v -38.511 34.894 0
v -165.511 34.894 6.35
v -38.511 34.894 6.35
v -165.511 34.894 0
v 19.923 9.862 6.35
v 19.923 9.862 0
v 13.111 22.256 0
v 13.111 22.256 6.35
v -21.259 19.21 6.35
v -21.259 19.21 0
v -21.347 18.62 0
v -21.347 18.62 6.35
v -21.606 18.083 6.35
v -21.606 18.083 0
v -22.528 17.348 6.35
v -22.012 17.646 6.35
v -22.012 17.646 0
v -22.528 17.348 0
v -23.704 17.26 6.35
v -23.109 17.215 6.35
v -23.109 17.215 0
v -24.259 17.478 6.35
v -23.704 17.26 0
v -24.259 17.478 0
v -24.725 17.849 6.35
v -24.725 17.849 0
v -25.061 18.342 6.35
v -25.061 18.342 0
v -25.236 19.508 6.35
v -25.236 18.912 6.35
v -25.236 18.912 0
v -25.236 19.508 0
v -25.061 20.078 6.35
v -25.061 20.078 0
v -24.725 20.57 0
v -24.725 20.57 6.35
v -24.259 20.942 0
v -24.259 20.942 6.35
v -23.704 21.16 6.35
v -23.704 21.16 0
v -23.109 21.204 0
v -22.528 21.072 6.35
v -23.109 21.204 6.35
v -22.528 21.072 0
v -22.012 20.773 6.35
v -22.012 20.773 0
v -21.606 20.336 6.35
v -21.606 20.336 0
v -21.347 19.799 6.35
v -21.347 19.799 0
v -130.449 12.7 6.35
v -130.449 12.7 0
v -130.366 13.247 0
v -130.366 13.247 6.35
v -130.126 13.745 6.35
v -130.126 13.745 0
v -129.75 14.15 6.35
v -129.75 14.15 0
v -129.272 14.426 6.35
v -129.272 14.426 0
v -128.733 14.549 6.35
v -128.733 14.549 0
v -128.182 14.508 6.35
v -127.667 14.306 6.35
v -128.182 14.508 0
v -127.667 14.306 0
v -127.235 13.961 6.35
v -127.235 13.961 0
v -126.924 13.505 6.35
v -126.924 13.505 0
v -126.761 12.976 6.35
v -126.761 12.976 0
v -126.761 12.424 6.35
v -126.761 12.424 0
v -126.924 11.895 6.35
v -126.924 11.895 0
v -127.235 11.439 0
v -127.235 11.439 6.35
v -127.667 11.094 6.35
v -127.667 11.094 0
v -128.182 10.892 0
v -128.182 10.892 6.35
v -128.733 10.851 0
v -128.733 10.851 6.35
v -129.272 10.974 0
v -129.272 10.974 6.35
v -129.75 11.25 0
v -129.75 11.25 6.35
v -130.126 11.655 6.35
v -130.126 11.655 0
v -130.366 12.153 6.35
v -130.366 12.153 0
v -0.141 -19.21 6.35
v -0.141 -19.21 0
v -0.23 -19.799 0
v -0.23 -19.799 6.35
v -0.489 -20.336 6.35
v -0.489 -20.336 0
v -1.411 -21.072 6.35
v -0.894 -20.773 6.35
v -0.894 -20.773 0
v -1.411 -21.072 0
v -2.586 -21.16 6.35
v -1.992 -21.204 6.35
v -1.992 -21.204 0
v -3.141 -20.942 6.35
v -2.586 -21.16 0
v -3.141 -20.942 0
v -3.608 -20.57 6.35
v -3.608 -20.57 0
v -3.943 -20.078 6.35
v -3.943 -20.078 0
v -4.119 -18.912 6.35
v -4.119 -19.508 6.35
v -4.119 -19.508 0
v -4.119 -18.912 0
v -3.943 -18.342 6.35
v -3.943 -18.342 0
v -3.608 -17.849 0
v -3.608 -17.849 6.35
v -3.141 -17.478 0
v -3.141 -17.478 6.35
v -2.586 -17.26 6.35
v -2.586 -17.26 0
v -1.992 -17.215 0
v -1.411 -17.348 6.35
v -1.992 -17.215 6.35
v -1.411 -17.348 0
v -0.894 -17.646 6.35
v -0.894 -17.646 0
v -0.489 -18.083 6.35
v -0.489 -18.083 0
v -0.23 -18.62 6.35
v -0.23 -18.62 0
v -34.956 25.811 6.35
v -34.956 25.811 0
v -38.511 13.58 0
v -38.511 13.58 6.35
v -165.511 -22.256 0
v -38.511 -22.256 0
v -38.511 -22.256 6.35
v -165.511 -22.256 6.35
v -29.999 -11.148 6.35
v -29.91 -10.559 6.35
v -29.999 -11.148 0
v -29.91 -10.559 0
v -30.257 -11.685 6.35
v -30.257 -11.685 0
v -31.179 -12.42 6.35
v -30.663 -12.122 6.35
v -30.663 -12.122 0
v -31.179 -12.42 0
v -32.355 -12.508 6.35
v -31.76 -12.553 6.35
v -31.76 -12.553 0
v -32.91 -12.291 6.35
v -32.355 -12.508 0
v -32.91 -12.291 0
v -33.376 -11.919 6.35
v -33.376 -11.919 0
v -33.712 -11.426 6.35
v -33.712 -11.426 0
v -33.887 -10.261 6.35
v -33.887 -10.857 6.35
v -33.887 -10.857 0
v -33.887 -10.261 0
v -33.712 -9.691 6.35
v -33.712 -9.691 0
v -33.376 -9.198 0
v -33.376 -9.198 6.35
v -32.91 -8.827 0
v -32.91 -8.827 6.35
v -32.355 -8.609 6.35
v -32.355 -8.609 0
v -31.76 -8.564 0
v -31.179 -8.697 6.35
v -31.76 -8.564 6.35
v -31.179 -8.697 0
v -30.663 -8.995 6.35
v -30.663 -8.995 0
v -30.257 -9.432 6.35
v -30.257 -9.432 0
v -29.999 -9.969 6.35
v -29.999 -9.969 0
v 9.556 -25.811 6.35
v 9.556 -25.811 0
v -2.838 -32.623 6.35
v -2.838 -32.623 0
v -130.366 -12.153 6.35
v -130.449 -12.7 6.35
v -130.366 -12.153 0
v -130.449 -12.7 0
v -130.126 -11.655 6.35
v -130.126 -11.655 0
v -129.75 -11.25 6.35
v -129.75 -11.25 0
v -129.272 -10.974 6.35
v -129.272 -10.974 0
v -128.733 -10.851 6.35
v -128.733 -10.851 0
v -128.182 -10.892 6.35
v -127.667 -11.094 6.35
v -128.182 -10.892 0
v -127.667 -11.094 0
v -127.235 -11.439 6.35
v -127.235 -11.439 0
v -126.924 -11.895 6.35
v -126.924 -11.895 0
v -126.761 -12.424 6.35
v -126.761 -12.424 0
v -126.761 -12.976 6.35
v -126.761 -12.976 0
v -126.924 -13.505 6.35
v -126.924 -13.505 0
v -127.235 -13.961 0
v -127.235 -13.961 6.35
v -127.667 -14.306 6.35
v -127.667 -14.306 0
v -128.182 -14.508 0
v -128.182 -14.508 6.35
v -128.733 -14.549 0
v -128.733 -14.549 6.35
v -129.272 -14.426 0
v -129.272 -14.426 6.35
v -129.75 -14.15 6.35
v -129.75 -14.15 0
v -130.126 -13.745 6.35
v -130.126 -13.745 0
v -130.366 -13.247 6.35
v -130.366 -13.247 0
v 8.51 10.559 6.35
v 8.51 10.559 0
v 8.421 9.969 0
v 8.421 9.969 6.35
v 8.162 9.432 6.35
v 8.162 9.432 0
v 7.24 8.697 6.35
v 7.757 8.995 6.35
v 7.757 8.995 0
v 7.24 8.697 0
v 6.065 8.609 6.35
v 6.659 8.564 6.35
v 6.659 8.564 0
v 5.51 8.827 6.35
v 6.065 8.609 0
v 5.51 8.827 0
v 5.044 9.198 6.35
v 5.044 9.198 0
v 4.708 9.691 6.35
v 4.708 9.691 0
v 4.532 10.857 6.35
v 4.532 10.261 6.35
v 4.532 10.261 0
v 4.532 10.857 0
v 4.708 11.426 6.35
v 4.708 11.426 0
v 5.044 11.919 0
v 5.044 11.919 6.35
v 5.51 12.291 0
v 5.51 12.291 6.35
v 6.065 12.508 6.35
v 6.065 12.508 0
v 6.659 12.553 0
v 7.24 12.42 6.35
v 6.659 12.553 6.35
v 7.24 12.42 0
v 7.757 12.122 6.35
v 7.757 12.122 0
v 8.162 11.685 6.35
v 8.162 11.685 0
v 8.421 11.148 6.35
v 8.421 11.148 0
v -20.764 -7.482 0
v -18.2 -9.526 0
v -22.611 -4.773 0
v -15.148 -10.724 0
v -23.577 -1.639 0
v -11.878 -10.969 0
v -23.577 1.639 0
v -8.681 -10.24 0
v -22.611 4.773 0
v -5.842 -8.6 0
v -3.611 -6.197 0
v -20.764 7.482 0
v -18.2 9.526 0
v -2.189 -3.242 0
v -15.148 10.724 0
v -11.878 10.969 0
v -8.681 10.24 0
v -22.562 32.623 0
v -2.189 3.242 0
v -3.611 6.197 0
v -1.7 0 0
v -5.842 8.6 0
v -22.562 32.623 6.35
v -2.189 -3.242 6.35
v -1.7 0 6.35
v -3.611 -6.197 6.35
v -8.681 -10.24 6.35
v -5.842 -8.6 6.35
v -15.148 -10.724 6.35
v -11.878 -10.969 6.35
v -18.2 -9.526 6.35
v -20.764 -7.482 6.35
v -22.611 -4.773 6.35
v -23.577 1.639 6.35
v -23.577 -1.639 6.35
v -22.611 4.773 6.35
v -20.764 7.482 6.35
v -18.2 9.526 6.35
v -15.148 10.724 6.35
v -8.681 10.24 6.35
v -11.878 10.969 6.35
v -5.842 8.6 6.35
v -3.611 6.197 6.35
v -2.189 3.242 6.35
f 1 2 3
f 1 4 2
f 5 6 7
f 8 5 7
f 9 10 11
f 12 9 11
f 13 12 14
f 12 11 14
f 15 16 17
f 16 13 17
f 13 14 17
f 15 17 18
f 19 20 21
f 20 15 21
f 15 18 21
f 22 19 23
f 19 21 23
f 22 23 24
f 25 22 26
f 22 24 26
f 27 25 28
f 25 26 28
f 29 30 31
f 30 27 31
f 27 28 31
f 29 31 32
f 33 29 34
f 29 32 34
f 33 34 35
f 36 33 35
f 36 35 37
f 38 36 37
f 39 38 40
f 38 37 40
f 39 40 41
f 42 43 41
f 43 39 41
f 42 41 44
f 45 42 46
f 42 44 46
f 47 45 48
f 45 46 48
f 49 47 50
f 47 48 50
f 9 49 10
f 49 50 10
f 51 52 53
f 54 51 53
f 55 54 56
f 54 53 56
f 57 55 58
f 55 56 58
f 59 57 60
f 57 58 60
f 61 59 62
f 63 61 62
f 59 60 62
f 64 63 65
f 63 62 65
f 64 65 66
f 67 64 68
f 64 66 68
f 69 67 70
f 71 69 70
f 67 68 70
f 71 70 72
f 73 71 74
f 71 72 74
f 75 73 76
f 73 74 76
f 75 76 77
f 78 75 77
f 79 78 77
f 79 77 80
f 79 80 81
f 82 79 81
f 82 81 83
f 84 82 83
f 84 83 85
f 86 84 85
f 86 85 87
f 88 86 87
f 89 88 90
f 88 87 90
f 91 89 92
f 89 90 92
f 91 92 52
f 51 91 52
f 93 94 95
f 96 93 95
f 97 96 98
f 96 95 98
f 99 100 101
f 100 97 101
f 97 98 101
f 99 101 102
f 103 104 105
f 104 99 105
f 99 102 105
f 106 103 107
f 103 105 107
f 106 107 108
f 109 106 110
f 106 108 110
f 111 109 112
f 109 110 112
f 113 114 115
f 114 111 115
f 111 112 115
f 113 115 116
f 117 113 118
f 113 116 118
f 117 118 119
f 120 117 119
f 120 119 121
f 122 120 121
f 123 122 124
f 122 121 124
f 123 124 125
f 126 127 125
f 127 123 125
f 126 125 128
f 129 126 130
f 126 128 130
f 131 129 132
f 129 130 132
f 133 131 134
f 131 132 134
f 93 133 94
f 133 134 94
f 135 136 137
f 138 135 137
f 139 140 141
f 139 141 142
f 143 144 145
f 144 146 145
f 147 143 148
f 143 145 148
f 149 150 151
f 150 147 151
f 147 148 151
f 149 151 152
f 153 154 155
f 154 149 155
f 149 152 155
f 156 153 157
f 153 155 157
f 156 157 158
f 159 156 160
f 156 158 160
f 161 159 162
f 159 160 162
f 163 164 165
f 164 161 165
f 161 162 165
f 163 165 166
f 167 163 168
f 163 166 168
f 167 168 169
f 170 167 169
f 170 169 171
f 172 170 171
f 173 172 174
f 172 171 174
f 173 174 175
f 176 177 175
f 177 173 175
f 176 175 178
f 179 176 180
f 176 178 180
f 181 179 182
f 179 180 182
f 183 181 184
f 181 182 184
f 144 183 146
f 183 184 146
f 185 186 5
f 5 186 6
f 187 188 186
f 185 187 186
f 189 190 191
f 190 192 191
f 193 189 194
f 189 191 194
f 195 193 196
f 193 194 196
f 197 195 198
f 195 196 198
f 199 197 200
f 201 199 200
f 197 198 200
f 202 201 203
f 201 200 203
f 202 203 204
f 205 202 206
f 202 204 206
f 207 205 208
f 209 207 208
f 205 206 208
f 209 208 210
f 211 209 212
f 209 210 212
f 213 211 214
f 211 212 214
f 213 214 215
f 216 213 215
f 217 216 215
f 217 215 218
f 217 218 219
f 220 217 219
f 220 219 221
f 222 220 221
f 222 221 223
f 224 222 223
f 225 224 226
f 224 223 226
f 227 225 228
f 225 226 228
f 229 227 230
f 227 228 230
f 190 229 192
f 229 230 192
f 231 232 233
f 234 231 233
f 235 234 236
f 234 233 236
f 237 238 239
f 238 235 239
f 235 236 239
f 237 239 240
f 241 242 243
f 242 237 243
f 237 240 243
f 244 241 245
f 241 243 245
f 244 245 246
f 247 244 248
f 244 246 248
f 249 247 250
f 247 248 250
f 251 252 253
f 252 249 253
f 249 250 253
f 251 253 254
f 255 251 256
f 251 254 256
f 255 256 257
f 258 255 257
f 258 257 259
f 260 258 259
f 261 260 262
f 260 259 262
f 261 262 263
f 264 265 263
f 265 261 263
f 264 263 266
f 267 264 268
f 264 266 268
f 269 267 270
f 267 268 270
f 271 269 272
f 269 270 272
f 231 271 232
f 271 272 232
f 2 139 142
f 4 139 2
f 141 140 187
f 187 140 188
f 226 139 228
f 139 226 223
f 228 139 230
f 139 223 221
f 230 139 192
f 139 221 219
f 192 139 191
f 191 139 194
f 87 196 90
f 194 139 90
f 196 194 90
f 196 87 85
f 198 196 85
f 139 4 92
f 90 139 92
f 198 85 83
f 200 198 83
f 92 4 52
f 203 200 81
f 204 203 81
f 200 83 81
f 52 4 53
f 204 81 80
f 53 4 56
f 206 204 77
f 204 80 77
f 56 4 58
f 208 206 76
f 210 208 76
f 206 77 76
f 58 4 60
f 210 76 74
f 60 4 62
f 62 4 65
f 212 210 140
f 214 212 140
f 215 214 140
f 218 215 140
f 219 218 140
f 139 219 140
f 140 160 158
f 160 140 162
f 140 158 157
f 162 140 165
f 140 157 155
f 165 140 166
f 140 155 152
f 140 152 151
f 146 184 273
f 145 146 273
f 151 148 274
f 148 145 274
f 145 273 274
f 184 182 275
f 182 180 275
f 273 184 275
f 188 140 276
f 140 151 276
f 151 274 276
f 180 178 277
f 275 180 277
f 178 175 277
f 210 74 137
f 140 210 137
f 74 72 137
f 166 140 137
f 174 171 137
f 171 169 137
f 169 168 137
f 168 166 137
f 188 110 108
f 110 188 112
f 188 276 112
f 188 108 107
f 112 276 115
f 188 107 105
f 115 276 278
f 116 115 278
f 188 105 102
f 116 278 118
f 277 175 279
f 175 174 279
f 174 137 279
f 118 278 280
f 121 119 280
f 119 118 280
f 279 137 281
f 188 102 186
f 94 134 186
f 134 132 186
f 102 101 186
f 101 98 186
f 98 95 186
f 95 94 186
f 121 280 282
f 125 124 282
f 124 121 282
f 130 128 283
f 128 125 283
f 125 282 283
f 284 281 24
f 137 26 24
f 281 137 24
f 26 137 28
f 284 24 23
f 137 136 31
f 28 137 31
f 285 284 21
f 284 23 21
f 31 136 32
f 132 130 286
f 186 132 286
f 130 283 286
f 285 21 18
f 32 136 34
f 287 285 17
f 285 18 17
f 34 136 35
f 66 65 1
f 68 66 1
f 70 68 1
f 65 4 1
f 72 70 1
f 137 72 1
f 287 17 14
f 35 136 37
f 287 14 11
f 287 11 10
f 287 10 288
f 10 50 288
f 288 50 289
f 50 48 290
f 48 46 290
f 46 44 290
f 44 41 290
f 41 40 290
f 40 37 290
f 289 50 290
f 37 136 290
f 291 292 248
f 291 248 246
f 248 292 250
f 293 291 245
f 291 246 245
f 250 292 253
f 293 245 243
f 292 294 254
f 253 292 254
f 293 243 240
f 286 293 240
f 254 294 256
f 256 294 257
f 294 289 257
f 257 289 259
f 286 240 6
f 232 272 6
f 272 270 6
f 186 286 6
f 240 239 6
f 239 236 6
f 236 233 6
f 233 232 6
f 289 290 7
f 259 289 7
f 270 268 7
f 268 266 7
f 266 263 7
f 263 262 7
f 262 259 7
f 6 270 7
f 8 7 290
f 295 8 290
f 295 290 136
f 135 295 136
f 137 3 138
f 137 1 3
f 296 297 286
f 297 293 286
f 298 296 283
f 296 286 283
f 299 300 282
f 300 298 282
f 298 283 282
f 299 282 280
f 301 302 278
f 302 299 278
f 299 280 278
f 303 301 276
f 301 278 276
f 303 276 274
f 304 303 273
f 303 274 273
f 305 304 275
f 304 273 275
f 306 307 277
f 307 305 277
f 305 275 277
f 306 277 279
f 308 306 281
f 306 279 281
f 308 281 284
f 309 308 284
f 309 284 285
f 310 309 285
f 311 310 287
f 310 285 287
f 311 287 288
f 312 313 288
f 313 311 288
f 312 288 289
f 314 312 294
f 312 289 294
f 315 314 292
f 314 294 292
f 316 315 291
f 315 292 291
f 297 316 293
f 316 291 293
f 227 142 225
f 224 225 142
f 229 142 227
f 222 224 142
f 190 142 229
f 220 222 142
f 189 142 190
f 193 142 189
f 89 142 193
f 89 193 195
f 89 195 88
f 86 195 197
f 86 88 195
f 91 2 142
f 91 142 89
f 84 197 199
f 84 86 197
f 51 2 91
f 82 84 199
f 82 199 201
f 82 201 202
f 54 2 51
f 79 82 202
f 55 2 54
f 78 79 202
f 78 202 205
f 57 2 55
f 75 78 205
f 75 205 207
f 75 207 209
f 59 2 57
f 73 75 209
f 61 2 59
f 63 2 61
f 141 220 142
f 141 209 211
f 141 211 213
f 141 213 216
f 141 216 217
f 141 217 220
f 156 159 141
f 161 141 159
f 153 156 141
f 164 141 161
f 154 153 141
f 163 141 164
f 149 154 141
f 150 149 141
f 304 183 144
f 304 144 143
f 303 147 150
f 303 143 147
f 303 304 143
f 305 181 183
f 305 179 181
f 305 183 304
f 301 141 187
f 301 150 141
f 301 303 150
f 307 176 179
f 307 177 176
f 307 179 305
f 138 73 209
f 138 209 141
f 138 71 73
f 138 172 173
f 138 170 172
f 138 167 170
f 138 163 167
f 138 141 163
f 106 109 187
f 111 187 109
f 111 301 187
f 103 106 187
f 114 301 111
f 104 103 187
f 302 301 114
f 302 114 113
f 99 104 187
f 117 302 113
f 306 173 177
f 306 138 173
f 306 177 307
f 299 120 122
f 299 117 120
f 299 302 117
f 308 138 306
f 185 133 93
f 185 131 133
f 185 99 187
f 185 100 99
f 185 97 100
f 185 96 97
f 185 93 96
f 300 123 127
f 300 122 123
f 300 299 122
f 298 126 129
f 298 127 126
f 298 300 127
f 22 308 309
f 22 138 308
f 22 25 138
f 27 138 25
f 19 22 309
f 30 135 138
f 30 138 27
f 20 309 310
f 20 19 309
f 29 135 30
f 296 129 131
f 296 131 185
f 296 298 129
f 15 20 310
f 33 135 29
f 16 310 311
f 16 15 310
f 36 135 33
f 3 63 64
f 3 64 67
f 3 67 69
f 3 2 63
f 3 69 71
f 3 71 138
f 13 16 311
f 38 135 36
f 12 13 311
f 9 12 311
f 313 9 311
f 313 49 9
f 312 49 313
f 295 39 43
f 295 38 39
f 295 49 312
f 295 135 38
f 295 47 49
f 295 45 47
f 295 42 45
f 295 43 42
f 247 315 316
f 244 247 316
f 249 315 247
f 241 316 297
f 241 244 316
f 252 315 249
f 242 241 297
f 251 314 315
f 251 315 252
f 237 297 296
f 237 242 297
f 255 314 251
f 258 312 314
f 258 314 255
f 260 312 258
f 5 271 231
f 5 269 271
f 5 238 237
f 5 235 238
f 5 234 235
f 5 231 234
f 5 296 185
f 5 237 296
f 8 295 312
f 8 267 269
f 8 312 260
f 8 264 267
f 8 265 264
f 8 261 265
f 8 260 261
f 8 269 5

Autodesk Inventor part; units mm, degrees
ref_plane "YZ Plane" through (0, 0, 0) normal (1, 0, 0) x (0, 1, 0)
ref_plane "XZ Plane" through (0, 0, 0) normal (0, 1, 0) x (-1, 0, 0)
ref_plane "XY Plane" through (0, 0, 0) normal (0, 0, 1) x (1, 0, 0)
sketch "Sketch1" plane through (0, 0, 0) normal (0, 0, 1) x (1, 0, 0)
  circle A0 centre (-2.1414, -19.2098) radius 2 projected
  circle A1 centre (-31.9098, -10.5586) radius 2 projected
  circle A2 centre (6.5098, 10.5586) radius 2 projected
  circle A3 centre (-23.2586, 19.2098) radius 2 projected
  line L0 (-28.6845, 20.7851) -> (-21.6804, 24.6349) projected
  line L1 (-21.6804, 24.6349) -> (8.0851, 15.9845) projected
  line L2 (8.0851, 15.9845) -> (11.9349, 8.9804) projected
  line L3 (11.9349, 8.9804) -> (3.2845, -20.7851) projected
  line L4 (3.2845, -20.7851) -> (-3.7196, -24.6349) projected
  line L5 (-3.7196, -24.6349) -> (-33.4851, -15.9845) projected
  line L6 (-33.4851, -15.9845) -> (-37.3349, -8.9804) projected
  line L7 (-37.3349, -8.9804) -> (-28.6845, 20.7851) projected
  line L8 (9.5562, -25.8106) -> (19.9232, 9.8616)
  line L9 (19.9232, 9.8616) -> (13.1106, 22.2562)
  line L10 (13.1106, 22.2562) -> (-22.5616, 32.6232)
  line L11 (-22.5616, 32.6232) -> (-34.9562, 25.8106)
  line L12 (-34.9562, 25.8106) -> (-45.3232, -9.8616)
  line L13 (-45.3232, -9.8616) -> (-38.5106, -22.2562)
  line L14 (-38.5106, -22.2562) -> (-2.8384, -32.6232)
  line L15 (-2.8384, -32.6232) -> (9.5562, -25.8106)
  line L16 (-38.5106, -22.2562) -> (-165.5106, -22.2562)
  line L17 (-165.5106, -22.2562) -> (-165.5106, 34.8938)
  line L18 (-165.5106, 34.8938) -> (-38.5106, 34.8938)
  line L19 (-38.5106, 34.8938) -> (-38.5106, -22.2562)
  circle A4 centre (-12.7, 0) radius 11 projected
  point P0 (0, 0)
  dimension "d0" = 127
  dimension "d1" = 57.15
  dimension "d2" = 57.15
extrude "Extrusion1" add sketch "Sketch1" along normal blind 6.35 contours L0 L1 L2 L3 L4 L5 L6 L7 | L15 L14 L19 L12 L11 L10 L9 L8 | L16 L17 L18 L19 L12 L13 | L13 L12 L19
sketch "Sketch2" plane through (0, 0, 0) normal (0, 0, -1) x (-1, 0, 0)
  line L0 (136.7986, -16.3493) -> (136.7986, -9.9993) projected
  line L1 (133.0902, -9.9993) -> (133.0902, -16.3493) projected
  line L2 (136.7986, 9.0507) -> (136.7986, 15.4007) projected
  line L3 (133.0902, 15.4007) -> (133.0902, 9.0507) projected
  line L4 (126.7402, -12.7) -> (130.4486, -12.7) construction
  line L5 (126.7402, 12.7) -> (130.4486, 12.7) construction
  circle A0 centre (128.5944, -12.7) radius 1.8542
  circle A1 centre (128.5944, 12.7) radius 1.8542
  dimension "d5" = 3.7084
  dimension "d6" = 3.7084
extrude "Extrusion2" cut sketch "Sketch2" against normal through all
sketch "Sketch3" plane through (0, 0, 0) normal (0, 0, -1) x (-1, 0, 0)
  line L0 (165.5106, 34.8938) -> (165.5106, -22.2562) projected
  line L1 (153.1125, 15.7309) -> (159.2102, 17.5031) projected
  line L2 (170.3558, -20.8481) -> (159.2102, 17.5031) projected
  line L3 (2.8384, -32.6232) -> (155.6197, 11.7778) projected
  line L4 (-9.5562, -25.8106) -> (2.8384, -32.6232) projected
  line L5 (-19.9232, 9.8616) -> (-9.5562, -25.8106) projected
  line L6 (-13.1106, 22.2562) -> (-19.9232, 9.8616) projected
  line L7 (154.986, 71.1081) -> (-13.1106, 22.2562) projected
  line L8 (145.7706, 63.7481) -> (155.0405, 31.851) projected
  line L9 (145.7706, 63.7481) -> (139.6729, 61.976) projected
  line L10 (139.6729, 61.976) -> (139.0916, 63.9761) projected
  line L11 (139.0916, 63.9761) -> (136.4086, 63.1964) projected
  line L12 (136.4086, 63.1964) -> (136.9899, 61.1963) projected
  line L13 (136.9899, 61.1963) -> (133.5752, 60.2039) projected
  line L14 (133.5752, 60.2039) -> (134.6101, 56.6429) projected
  line L15 (134.6101, 56.6429) -> (138.0248, 57.6352) projected
  line L16 (138.0248, 57.6352) -> (138.606, 55.6352) projected
  line L17 (138.606, 55.6352) -> (141.289, 56.4149) projected
  line L18 (141.289, 56.4149) -> (140.7078, 58.415) projected
  line L19 (140.7078, 58.415) -> (146.8055, 60.1871) projected
  line L20 (158.1753, 21.0641) -> (146.8055, 60.1871) projected
  line L21 (158.1753, 21.0641) -> (152.0776, 19.292) projected
  line L22 (152.0776, 19.292) -> (151.4964, 21.2921) projected
  line L23 (151.4964, 21.2921) -> (148.8134, 20.5123) projected
  line L24 (148.8134, 20.5123) -> (149.3946, 18.5123) projected
  line L25 (149.3946, 18.5123) -> (145.9799, 17.5199) projected
  line L26 (145.9799, 17.5199) -> (147.0148, 13.9588) projected
  line L27 (147.0148, 13.9588) -> (150.4295, 14.9512) projected
  line L28 (150.4295, 14.9512) -> (151.0108, 12.9512) projected
  line L29 (151.0108, 12.9512) -> (153.6938, 13.7309) projected
  line L30 (153.6938, 13.7309) -> (153.1125, 15.7309) projected
  circle A0 centre (132.6412, 48.0825) radius 1.8542 projected
  circle A1 centre (139.7296, 23.6916) radius 1.8542 projected
  circle A2 centre (2.1414, -19.2098) radius 2 projected
  circle A3 centre (31.9098, -10.5586) radius 2 projected
  circle A4 centre (-6.5098, 10.5586) radius 2 projected
  circle A5 centre (23.2586, 19.2098) radius 2 projected
  circle A6 centre (12.7, 0) radius 11 projected
  point P0 (165.5106, -22.2562)
extrude "Extrusion3" [suppressed]
equation "\"d2\" = d1"
properties part number "tiltColumnStepperSide02" material "Gold"
